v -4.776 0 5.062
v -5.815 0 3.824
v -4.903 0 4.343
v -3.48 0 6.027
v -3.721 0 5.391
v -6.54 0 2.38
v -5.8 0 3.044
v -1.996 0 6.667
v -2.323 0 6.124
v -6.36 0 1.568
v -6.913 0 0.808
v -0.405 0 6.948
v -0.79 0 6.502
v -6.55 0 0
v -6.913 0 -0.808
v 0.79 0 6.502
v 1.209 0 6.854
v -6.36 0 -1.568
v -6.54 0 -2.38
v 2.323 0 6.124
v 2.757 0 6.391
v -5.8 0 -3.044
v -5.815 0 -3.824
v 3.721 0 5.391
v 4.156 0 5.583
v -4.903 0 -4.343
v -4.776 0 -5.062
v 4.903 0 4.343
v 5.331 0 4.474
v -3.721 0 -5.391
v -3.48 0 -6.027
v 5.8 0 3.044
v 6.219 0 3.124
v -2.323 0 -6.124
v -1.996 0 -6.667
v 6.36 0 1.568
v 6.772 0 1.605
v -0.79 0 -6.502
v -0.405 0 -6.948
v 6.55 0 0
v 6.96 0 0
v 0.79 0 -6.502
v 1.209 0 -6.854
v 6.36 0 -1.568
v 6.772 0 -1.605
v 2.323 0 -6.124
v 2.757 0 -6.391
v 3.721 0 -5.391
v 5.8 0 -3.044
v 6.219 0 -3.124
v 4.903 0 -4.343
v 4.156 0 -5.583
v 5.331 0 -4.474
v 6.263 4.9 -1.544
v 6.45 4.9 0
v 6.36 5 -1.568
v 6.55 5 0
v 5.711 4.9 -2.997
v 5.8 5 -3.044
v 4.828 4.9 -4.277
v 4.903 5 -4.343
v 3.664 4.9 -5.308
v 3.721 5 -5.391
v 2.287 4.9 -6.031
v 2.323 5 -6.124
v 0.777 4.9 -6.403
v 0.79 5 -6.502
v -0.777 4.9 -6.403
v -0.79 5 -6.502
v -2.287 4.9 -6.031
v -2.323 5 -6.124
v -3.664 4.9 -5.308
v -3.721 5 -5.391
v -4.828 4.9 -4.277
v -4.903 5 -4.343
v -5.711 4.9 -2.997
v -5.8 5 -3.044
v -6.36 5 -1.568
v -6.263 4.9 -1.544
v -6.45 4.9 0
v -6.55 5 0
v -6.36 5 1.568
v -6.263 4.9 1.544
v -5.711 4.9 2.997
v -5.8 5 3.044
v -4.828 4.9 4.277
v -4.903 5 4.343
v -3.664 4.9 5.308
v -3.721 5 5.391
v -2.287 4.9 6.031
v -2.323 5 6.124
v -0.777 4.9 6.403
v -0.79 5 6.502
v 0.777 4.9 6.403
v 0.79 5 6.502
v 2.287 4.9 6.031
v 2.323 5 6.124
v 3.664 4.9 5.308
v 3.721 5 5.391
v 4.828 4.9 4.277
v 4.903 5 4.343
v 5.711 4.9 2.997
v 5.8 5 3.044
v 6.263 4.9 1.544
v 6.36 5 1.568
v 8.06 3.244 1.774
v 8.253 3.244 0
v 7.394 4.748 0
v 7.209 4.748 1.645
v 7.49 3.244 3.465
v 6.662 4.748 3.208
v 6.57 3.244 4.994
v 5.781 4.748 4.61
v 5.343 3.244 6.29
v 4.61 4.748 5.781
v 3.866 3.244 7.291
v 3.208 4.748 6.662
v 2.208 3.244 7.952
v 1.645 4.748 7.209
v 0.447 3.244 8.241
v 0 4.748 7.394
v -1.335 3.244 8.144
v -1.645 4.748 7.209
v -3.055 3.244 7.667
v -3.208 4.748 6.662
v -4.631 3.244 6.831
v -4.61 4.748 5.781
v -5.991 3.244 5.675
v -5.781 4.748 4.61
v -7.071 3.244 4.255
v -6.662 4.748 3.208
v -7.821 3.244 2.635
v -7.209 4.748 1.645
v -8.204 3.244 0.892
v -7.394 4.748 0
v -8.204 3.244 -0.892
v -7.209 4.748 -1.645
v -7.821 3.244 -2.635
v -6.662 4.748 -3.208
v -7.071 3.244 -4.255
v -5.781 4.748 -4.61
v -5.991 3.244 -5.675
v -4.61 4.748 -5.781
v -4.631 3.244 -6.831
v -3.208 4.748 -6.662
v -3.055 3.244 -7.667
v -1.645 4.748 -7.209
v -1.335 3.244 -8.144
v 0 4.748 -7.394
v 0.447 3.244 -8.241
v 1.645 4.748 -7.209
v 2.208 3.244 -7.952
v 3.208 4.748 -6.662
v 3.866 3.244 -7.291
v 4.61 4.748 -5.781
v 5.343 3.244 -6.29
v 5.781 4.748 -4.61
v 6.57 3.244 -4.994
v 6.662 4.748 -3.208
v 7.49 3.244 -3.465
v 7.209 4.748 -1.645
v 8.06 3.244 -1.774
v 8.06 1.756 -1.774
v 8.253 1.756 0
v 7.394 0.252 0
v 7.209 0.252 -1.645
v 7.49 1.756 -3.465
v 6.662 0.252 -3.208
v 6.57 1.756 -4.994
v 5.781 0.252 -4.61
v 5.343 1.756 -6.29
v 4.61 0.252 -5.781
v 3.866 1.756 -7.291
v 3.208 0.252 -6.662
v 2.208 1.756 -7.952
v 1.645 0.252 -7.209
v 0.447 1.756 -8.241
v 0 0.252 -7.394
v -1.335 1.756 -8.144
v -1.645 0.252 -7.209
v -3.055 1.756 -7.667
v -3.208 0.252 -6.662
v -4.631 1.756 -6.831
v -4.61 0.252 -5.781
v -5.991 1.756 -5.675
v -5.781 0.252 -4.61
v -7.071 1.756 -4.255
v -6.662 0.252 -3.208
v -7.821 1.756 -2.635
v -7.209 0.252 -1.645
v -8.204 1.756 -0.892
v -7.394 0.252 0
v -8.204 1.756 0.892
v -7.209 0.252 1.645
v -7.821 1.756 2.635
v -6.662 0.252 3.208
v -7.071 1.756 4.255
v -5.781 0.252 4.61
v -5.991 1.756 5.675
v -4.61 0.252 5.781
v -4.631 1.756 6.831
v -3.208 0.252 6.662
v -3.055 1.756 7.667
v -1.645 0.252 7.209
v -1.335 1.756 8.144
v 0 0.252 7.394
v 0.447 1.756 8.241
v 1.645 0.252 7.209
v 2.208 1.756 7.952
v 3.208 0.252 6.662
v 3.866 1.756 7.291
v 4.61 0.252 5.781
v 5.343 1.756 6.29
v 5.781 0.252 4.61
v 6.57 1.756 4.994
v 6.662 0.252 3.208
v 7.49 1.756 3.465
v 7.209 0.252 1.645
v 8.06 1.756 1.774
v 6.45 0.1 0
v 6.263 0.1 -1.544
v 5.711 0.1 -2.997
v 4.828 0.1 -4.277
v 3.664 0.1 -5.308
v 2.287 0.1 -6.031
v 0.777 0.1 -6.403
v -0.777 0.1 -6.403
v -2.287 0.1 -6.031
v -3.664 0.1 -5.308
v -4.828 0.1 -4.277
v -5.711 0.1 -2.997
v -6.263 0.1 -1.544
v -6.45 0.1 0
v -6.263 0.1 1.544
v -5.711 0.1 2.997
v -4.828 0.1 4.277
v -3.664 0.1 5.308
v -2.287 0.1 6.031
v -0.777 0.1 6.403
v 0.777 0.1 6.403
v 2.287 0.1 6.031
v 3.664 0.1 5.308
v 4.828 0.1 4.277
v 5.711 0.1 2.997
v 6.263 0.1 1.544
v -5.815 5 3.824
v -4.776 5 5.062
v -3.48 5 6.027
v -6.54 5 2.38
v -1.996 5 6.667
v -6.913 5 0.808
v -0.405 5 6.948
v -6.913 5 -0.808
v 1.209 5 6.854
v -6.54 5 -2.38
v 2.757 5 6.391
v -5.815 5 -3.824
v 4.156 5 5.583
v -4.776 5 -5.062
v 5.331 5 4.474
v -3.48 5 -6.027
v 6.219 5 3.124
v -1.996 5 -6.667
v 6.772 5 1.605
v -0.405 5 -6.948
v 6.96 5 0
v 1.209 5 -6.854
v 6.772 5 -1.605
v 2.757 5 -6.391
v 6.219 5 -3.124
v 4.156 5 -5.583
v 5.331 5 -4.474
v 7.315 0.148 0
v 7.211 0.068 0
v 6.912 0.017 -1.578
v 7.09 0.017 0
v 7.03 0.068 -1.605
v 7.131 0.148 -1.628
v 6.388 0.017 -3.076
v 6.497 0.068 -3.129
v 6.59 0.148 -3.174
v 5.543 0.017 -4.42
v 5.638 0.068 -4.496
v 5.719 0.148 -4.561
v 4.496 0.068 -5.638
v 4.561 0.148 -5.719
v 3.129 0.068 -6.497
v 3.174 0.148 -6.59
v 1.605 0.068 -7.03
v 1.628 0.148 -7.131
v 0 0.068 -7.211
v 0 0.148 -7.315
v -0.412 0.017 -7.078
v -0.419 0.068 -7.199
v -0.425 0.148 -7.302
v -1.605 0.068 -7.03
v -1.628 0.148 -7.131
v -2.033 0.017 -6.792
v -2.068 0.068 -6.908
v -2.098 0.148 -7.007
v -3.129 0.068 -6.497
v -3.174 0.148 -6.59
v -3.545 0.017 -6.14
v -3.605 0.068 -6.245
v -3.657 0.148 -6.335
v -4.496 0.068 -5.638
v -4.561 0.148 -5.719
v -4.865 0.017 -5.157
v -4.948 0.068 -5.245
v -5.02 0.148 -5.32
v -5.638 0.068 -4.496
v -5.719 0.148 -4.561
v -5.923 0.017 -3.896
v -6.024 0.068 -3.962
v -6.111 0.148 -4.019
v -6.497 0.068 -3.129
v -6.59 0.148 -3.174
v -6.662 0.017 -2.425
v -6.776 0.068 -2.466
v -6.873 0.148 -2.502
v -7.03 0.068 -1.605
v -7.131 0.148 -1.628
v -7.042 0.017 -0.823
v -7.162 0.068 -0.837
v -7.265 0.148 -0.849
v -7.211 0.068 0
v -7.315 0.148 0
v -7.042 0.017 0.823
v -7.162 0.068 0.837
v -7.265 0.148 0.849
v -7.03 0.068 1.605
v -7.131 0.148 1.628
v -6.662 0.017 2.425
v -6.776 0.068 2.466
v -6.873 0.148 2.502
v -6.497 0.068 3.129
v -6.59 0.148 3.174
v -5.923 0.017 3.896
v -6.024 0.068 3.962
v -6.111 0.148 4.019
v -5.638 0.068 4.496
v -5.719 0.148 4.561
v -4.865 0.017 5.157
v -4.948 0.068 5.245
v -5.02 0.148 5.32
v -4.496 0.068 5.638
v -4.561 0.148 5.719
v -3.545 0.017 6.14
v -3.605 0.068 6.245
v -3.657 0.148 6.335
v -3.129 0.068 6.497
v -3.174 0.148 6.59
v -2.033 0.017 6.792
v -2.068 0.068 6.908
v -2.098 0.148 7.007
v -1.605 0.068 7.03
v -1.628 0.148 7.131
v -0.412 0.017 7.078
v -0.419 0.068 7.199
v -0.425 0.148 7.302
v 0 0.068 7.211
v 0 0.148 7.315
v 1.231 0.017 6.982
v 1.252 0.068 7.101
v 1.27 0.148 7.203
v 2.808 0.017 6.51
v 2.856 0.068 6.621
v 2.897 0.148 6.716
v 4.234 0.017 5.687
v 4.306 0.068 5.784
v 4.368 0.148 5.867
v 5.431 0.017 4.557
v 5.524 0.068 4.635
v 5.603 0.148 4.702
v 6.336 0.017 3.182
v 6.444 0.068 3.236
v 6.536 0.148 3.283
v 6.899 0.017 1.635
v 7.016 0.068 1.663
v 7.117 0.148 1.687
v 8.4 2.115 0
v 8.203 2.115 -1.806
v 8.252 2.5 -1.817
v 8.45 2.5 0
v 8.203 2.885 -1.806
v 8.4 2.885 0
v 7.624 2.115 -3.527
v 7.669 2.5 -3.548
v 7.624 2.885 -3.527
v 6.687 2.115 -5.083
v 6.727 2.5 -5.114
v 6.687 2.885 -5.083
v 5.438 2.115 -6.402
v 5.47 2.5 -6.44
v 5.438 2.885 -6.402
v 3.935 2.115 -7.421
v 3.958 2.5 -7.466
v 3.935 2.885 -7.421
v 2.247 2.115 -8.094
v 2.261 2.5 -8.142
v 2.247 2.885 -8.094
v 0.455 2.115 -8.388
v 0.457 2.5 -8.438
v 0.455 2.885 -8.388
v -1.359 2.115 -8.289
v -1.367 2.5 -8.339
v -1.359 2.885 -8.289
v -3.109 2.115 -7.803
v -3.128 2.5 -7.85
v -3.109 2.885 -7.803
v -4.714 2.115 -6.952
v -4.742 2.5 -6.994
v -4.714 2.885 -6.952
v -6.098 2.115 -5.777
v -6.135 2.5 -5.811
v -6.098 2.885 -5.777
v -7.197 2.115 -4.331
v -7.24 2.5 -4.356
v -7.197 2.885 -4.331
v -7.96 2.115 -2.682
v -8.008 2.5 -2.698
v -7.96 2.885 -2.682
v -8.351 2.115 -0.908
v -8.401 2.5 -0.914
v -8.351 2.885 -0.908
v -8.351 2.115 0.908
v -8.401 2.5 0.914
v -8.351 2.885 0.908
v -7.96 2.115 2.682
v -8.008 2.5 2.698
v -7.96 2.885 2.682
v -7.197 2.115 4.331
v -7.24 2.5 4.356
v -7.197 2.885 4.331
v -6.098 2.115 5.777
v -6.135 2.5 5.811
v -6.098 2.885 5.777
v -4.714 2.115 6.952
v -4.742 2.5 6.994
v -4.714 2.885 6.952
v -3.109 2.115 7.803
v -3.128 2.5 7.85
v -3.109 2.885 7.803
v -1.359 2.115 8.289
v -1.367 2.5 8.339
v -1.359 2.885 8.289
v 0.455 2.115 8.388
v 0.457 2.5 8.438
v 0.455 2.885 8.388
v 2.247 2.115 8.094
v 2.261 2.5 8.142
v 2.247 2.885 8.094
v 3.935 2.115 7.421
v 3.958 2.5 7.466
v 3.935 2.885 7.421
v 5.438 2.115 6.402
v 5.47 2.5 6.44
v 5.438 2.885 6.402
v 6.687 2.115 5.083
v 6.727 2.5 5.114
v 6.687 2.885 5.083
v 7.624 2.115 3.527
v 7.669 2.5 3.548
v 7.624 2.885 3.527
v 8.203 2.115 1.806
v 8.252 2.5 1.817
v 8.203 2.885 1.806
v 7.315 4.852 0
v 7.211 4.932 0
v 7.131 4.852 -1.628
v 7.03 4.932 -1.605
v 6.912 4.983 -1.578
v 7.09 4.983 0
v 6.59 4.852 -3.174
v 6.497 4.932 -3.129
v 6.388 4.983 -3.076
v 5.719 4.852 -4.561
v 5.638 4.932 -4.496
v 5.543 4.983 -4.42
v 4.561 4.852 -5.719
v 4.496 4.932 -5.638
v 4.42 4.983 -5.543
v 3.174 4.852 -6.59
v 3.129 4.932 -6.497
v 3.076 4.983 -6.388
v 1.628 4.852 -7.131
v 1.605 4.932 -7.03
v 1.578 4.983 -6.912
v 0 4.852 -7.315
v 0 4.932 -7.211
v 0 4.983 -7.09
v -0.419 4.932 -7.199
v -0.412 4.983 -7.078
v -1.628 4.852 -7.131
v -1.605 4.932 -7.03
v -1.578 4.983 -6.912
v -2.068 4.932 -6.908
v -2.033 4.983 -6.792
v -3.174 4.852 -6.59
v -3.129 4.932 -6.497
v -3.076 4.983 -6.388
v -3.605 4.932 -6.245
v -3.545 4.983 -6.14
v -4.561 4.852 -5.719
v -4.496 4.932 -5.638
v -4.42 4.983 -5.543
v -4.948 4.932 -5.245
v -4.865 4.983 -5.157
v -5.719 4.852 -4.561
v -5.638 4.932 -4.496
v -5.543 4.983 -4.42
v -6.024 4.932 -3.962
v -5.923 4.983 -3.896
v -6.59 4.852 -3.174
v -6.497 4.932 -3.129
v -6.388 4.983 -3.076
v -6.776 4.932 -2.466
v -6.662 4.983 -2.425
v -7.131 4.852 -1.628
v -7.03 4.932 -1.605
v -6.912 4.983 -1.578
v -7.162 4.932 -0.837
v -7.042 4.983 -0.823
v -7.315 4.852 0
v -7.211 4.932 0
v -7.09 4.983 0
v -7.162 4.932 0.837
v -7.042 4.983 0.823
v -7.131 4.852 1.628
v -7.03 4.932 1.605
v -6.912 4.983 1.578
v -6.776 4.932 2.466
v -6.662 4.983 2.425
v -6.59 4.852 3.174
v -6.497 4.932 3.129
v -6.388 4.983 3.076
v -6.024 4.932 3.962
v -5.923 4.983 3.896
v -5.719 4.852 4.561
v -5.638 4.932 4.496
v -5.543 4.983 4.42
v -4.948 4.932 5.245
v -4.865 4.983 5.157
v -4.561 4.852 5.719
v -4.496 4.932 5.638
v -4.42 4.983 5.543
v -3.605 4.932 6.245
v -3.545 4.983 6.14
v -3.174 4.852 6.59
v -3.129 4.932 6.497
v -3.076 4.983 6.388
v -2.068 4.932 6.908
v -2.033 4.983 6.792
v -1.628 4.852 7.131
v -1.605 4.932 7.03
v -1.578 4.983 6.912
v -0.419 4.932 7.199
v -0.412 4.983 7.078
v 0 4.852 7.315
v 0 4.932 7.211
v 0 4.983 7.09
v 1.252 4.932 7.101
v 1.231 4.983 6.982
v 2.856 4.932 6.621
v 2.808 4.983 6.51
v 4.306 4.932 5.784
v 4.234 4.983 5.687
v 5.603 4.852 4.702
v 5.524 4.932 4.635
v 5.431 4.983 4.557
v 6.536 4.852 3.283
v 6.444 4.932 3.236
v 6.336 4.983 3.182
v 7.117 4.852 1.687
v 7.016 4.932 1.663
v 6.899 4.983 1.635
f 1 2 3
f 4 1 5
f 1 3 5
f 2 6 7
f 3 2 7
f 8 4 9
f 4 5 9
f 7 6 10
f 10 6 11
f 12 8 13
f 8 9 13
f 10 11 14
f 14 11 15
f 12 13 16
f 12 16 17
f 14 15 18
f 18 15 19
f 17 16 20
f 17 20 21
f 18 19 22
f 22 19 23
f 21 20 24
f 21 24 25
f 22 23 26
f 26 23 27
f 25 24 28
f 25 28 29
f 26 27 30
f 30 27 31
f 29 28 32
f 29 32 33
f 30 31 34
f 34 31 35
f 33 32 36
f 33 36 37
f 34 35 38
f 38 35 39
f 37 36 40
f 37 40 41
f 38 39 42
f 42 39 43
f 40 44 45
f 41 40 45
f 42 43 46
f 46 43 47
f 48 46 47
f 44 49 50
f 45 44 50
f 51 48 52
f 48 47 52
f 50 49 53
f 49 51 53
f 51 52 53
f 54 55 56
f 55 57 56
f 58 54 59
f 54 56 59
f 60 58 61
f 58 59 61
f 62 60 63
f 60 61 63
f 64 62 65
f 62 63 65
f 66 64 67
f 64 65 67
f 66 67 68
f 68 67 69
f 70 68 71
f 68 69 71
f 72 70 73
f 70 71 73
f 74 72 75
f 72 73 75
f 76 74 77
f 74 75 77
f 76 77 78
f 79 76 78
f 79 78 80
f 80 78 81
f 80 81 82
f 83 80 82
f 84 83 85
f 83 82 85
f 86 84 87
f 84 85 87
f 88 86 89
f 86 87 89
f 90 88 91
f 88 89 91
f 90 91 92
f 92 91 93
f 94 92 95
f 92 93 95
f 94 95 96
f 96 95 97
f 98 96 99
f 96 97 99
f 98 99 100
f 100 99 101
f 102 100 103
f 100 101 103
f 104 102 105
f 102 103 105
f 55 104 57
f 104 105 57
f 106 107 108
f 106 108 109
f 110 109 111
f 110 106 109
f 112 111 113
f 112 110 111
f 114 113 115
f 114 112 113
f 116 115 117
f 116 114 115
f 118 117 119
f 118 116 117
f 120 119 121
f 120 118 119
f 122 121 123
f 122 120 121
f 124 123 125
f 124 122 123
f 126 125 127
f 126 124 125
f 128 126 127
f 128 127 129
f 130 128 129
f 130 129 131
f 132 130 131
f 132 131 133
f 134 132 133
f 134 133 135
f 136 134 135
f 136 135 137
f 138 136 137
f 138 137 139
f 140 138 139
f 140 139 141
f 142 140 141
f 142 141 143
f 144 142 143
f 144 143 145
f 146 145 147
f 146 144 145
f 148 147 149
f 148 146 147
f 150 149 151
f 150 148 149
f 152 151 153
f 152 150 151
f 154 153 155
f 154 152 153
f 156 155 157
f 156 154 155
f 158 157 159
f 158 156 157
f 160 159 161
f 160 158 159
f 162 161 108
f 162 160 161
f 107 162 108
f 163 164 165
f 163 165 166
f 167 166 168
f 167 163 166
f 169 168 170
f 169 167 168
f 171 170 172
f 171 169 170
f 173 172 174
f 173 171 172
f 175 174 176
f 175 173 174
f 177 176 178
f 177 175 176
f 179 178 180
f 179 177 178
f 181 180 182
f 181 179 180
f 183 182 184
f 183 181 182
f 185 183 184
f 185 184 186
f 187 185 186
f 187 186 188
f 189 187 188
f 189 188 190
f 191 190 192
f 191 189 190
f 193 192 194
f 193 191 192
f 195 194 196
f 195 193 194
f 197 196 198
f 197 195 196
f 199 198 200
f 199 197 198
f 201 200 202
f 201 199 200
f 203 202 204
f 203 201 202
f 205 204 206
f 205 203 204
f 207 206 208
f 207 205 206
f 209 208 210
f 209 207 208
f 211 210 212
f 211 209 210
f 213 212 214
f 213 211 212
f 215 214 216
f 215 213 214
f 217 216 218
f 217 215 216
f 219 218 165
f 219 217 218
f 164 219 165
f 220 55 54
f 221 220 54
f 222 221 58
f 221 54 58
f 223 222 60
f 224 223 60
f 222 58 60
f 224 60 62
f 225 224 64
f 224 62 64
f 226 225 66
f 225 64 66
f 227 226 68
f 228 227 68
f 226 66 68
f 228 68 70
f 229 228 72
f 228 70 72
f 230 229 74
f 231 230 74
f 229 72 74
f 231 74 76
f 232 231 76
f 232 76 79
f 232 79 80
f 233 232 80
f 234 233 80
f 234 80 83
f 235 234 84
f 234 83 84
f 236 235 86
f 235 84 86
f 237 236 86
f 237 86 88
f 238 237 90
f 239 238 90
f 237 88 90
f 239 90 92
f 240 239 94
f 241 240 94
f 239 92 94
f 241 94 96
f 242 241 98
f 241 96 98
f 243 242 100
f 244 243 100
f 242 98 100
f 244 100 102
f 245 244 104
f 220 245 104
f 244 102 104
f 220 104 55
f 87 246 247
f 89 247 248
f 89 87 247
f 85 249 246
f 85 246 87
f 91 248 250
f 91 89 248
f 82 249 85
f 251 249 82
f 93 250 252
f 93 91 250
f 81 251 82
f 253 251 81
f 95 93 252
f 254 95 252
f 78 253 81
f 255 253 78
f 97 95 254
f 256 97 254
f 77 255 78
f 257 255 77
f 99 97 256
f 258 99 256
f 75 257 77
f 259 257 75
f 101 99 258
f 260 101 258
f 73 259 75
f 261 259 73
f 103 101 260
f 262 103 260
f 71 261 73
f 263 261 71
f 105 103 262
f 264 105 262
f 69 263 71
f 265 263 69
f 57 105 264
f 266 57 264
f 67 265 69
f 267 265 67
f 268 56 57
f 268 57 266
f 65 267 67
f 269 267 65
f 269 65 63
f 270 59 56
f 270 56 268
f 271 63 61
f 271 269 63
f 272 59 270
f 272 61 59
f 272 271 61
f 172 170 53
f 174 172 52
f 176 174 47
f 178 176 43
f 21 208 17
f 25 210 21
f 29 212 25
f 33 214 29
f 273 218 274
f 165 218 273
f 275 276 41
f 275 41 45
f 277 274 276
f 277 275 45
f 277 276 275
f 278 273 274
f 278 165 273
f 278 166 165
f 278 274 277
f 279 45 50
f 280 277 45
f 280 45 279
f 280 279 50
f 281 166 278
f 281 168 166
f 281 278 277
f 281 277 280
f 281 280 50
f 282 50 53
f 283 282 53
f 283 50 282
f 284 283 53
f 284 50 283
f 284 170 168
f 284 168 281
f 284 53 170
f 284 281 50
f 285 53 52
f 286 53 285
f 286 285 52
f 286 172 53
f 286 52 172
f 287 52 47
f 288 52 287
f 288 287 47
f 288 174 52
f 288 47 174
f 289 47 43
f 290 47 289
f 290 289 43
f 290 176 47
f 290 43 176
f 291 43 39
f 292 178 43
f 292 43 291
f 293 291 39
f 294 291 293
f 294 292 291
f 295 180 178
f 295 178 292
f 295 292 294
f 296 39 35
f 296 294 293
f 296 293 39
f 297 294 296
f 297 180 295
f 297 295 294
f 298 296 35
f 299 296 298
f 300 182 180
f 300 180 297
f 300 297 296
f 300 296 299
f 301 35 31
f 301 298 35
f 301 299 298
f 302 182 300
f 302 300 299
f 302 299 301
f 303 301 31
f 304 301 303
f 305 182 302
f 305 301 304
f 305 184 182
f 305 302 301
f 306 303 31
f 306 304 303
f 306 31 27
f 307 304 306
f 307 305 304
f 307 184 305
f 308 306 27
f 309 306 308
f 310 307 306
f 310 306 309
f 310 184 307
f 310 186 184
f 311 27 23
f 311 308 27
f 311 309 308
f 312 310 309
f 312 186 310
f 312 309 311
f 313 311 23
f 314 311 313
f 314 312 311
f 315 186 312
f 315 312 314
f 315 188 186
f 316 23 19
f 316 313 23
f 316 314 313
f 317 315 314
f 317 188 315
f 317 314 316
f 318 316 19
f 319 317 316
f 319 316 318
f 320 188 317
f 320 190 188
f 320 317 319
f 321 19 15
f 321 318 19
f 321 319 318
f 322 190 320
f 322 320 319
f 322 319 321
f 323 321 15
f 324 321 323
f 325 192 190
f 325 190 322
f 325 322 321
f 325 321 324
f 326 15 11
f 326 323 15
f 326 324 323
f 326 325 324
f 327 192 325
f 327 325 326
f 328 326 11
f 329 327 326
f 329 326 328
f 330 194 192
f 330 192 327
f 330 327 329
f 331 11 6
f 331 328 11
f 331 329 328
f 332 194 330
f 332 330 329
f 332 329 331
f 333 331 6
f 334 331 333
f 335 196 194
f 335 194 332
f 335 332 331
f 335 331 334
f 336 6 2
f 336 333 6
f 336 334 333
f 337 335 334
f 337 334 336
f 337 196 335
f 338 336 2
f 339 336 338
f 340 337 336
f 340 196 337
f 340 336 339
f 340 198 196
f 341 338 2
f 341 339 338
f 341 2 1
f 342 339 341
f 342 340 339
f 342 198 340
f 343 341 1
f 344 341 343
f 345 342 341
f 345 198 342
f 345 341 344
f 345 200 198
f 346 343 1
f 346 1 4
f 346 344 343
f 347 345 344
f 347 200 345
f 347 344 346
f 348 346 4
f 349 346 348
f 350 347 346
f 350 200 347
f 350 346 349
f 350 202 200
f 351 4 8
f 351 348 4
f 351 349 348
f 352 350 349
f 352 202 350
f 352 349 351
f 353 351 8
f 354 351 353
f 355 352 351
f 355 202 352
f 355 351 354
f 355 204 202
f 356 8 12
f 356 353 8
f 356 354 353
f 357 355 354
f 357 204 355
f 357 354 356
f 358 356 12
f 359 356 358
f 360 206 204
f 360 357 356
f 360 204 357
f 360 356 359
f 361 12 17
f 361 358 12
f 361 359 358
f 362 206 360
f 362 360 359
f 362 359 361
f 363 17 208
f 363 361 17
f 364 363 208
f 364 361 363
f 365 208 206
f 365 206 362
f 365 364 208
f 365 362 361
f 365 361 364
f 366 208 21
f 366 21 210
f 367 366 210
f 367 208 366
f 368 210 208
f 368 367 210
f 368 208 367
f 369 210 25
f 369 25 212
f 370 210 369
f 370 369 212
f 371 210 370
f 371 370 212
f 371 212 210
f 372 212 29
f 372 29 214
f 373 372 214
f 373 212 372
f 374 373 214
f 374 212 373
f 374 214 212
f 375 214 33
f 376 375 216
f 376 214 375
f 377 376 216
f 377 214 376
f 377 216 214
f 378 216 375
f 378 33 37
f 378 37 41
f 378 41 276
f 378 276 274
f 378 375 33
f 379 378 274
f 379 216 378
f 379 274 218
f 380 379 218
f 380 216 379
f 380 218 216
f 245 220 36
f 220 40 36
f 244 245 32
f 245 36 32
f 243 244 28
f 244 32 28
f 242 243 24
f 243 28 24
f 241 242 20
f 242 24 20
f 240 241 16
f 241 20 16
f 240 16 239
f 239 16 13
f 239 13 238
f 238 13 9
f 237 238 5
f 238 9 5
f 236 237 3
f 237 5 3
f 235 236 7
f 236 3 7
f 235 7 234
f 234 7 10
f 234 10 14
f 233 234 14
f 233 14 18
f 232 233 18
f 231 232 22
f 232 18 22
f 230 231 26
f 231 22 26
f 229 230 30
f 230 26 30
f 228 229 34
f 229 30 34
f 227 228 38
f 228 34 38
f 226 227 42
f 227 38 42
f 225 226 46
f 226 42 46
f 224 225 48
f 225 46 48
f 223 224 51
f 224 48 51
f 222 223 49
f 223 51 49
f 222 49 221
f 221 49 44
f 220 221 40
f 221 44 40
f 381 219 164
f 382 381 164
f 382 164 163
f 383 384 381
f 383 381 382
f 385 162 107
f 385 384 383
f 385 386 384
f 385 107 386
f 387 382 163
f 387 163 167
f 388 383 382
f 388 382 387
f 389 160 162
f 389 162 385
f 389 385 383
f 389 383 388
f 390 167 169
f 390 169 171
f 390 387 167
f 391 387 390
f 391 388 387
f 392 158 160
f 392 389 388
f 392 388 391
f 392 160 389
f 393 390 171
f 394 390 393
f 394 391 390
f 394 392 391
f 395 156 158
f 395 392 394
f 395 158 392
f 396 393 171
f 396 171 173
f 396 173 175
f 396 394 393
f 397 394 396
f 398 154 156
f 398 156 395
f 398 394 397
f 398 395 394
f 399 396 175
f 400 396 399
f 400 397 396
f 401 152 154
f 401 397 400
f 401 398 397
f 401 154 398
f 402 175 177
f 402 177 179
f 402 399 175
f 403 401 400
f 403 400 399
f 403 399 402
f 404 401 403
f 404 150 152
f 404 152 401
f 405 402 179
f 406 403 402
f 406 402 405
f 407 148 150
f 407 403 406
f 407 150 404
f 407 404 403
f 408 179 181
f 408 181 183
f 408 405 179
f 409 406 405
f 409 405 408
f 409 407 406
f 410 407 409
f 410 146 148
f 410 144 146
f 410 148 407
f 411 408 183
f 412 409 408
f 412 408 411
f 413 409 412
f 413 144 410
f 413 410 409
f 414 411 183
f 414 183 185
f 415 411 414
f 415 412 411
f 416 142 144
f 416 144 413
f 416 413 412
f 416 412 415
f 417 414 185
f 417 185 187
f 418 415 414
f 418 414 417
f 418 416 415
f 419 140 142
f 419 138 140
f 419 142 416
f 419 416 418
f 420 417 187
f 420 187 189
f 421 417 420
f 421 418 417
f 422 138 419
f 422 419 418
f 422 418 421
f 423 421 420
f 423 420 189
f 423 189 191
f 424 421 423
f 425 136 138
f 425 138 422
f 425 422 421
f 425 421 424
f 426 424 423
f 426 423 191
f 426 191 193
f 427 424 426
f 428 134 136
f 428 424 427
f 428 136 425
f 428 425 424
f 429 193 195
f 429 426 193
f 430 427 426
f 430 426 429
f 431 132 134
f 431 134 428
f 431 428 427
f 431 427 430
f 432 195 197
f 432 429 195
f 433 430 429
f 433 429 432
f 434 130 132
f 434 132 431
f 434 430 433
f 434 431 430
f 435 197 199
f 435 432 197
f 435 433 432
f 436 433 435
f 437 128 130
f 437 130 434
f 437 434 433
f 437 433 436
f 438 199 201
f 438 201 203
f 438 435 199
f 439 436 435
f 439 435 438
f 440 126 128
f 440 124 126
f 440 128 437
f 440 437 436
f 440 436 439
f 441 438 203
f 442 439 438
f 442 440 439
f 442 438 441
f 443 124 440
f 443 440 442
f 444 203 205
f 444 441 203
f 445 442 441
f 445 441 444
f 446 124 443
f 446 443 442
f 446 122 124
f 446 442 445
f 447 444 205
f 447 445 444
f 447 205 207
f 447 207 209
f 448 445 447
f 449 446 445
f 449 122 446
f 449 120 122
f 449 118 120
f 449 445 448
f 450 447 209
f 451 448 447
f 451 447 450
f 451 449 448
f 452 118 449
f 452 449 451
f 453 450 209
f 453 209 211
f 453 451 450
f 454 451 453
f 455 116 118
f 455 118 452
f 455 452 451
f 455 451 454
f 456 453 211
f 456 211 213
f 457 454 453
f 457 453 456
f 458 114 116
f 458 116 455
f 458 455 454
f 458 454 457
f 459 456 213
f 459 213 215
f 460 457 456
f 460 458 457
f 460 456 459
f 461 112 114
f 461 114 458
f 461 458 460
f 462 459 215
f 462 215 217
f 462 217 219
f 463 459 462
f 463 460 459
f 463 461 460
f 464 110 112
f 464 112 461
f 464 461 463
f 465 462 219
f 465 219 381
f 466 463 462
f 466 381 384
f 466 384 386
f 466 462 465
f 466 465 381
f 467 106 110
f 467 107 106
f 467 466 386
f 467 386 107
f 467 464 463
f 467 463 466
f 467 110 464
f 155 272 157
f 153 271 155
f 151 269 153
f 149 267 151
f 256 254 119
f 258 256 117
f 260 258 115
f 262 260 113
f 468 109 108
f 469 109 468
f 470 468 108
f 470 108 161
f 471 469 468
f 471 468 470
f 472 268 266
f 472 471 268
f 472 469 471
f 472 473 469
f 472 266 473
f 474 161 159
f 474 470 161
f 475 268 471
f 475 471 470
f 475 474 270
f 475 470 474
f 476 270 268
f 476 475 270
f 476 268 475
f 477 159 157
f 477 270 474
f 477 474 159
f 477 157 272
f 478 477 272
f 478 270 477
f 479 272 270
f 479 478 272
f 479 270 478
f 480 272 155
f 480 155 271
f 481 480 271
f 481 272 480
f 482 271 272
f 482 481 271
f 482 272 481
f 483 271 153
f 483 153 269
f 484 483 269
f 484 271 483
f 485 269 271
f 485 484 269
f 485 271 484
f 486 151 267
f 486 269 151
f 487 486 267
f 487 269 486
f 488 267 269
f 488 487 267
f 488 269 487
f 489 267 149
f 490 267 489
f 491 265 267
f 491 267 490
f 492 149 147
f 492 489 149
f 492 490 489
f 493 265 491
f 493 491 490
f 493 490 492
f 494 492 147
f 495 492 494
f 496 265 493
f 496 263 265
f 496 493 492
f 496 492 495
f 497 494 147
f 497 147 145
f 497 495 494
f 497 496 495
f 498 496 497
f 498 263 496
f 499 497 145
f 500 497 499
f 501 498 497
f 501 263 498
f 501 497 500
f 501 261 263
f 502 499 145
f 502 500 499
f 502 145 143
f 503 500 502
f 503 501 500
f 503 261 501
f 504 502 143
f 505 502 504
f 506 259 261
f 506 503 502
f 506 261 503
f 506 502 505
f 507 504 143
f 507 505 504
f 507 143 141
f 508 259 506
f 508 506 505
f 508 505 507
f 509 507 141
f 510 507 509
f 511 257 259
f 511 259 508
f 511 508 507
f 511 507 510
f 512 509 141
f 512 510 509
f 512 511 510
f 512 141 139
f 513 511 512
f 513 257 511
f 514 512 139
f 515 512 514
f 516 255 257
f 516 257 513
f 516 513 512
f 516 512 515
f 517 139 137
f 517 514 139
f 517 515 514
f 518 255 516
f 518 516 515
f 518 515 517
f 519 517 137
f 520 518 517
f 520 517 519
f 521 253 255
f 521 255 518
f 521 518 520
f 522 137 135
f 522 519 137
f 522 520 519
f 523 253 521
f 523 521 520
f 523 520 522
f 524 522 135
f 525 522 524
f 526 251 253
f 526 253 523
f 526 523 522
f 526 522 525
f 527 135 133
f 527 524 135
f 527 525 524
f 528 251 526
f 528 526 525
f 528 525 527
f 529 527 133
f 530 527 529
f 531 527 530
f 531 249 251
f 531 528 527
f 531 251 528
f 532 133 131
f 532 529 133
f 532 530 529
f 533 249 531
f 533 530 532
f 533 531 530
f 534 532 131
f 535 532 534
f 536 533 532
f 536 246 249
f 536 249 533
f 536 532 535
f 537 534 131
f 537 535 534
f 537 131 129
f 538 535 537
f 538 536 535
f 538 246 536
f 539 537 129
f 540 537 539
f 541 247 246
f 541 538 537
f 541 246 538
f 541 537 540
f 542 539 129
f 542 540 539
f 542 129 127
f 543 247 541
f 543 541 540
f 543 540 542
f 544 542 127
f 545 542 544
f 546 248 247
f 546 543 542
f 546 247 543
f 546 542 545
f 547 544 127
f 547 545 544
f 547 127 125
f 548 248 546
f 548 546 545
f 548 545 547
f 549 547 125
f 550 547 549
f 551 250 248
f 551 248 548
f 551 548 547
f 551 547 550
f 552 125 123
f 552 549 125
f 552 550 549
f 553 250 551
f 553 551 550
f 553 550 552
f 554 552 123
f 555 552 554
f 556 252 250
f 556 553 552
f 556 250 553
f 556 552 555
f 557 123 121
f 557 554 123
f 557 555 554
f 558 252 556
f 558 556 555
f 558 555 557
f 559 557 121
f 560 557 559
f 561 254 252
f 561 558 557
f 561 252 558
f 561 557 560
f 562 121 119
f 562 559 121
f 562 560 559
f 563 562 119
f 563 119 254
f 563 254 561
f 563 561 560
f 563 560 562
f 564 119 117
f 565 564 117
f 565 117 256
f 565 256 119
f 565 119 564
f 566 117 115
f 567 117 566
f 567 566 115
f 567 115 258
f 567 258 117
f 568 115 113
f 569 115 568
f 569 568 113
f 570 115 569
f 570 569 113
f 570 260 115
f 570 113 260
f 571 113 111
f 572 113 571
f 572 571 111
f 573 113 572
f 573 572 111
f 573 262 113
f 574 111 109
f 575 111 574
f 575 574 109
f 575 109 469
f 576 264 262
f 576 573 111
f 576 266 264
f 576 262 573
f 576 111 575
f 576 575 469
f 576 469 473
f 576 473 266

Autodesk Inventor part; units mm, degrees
ref_plane "YZ Plane" through (0, 0, 0) normal (1, 0, 0) x (0, 1, 0)
ref_plane "XZ Plane" through (0, 0, 0) normal (0, 1, 0) x (-1, 0, 0)
ref_plane "XY Plane" through (0, 0, 0) normal (0, 0, 1) x (1, 0, 0)
sketch "Sketch1" plane through (0, 0, 0) normal (0, 0, 1) x (1, 0, 0)
  line L0 (0, 0) -> (6.45, 0)
  line L1 (6.45, 0) -> (6.45, 5)
  line L2 (6.45, 5) -> (6.9597, 5)
  line L3 (7.3939, 4.7479) -> (8.2527, 3.2437)
  line L4 (8.2527, 1.7563) -> (7.3939, 0.2521)
  line L5 (6.9597, 0) -> (6.45, 0)
  arc A0 (8.2527, 1.7563) -> (8.2527, 3.2437) centre (6.95, 2.5) ccw
  arc A1 (7.3939, 4.7479) -> (6.9597, 5) centre (6.9597, 4.5) ccw
  arc A2 (6.9597, 0) -> (7.3939, 0.2521) centre (6.9597, 0.5) ccw
  line L6 (0, 0) -> (0, 12.2617)
  point P0 (7.25, 5)
  point P1 (7.25, 0)
  dimension "d0" = 5
  dimension "d1" = 6.45
  dimension "d2" = 0.8
  dimension "d3" = 1.5
  dimension "d4" = 0.5
  dimension "d5" = 2
revolve "Revolution1" add sketch "Sketch1" angle 360 about axis through (0, 0, 0) along (0, 1, 0)
chamfer "Chamfer1" distance 0.1 angle 45 2 edges at (-6.45, 0, 0) (-6.45, 5, 0)
properties part number "idl-tire"
